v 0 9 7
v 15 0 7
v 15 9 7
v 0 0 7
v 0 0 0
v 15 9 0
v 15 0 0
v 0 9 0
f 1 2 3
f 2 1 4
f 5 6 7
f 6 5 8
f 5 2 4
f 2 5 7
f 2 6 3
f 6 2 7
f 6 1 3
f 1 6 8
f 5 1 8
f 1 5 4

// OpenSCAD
// Generated by SolidPython 1.0.1 on 2020-07-29 00:46:55


cube(size = [15, 9, 7]);
/***********************************************
*********      SolidPython code:      **********
************************************************
 
# import packages: SolidPython
from solid import *
from solid.utils import *
from itertools import chain, combinations, permutations


class Resize:

    def __init__(self, scad_file):
        self.scad_file = scad_file
        #self.scad_file = import_scad(scad_file)
        # cone/cylinder param:
        self.r1 = 0
        self.r2 = 0
        self.h = 0
        # rectangular prism param:
        self.w = 0
        self.l = 0
        # ellipse param:
        self.r = 0

    # import OpenScad code (file name corresponds to shape)


    # classify shape + parameters
    def assign(self, param1, param2, param3):
        if self.scad_file == 'cone.scad':
            self.r1 = param1
            self.r2 = param2
            self.h = param3
        elif self.scad_file == 'cylinder.scad':
            self.r1 = param1
            self.r2 = param2
            self.h = param3
        elif self.scad_file == 'rectangularPrism.scad':
            self.h = param1
            self.l = param2
            self.w = param3
        else:
            self.r = param1
            self.h = param2

    # resize parameters
    def iterate(self):
        x = range(3, 20, 2)
        i = 1
        if self.scad_file == 'cone.scad':
            tempList = list(permutations(x, 2))
            for temp in tempList:
                param1 = temp[0]
                param2 = temp[1]
                filepath = 'produced_scad_files/' + 'cone' + str(param1) + '_' + str(param2) + '_' + '.scad'
                scad_render_to_file(cylinder(h=param1, r1=param2, r2=0), filepath)

        elif self.scad_file == 'cylinder.scad':
            tempList = list(permutations(x, 3))
            for temp in tempList:
                param1 = temp[0]
                param2 = temp[1]
                filepath = 'produced_scad_files/' + 'cylinder' + str(param1) + '_' + str(param2) + '_' + '.scad'
                scad_render_to_file(cylinder(h=param1, r1=param2, r2=param2), filepath)

        elif self.scad_file == 'rectangularPrism.scad':
            tempList = list(permutations(x, 3))
            for temp in tempList:
                param1 = temp[0]
                param2 = temp[1]
                param3 = temp[2]
                filepath = 'produced_scad_files/' + 'rectangularPrism' + str(param1) + '_' + str(param2) + '_' + str(
                    param3) + '.scad'
                scad_render_to_file(cube(size=(param1, param2, param3)), filepath)

        elif self.scad_file == 'ellipse.scad':
            tempList = list(permutations(x, 4))
            for temp in tempList:
                param1 = temp[0]
                param2 = temp[1]
                param3 = temp[2]
                param4 = temp[3]
                filepath = 'produced_scad_files/' + 'ellipse' + str(param1) + '_' + str(param2) + '_' + str(param3) + '_' + str(param4) + '.scad'
                scad_render_to_file(scale([param1, param2, param3])(sphere(r=param4)), filepath)

    def render_to_scadfile(self):
        scad_render_to_file(scad, 'example.scad') 
 
************************************************/
